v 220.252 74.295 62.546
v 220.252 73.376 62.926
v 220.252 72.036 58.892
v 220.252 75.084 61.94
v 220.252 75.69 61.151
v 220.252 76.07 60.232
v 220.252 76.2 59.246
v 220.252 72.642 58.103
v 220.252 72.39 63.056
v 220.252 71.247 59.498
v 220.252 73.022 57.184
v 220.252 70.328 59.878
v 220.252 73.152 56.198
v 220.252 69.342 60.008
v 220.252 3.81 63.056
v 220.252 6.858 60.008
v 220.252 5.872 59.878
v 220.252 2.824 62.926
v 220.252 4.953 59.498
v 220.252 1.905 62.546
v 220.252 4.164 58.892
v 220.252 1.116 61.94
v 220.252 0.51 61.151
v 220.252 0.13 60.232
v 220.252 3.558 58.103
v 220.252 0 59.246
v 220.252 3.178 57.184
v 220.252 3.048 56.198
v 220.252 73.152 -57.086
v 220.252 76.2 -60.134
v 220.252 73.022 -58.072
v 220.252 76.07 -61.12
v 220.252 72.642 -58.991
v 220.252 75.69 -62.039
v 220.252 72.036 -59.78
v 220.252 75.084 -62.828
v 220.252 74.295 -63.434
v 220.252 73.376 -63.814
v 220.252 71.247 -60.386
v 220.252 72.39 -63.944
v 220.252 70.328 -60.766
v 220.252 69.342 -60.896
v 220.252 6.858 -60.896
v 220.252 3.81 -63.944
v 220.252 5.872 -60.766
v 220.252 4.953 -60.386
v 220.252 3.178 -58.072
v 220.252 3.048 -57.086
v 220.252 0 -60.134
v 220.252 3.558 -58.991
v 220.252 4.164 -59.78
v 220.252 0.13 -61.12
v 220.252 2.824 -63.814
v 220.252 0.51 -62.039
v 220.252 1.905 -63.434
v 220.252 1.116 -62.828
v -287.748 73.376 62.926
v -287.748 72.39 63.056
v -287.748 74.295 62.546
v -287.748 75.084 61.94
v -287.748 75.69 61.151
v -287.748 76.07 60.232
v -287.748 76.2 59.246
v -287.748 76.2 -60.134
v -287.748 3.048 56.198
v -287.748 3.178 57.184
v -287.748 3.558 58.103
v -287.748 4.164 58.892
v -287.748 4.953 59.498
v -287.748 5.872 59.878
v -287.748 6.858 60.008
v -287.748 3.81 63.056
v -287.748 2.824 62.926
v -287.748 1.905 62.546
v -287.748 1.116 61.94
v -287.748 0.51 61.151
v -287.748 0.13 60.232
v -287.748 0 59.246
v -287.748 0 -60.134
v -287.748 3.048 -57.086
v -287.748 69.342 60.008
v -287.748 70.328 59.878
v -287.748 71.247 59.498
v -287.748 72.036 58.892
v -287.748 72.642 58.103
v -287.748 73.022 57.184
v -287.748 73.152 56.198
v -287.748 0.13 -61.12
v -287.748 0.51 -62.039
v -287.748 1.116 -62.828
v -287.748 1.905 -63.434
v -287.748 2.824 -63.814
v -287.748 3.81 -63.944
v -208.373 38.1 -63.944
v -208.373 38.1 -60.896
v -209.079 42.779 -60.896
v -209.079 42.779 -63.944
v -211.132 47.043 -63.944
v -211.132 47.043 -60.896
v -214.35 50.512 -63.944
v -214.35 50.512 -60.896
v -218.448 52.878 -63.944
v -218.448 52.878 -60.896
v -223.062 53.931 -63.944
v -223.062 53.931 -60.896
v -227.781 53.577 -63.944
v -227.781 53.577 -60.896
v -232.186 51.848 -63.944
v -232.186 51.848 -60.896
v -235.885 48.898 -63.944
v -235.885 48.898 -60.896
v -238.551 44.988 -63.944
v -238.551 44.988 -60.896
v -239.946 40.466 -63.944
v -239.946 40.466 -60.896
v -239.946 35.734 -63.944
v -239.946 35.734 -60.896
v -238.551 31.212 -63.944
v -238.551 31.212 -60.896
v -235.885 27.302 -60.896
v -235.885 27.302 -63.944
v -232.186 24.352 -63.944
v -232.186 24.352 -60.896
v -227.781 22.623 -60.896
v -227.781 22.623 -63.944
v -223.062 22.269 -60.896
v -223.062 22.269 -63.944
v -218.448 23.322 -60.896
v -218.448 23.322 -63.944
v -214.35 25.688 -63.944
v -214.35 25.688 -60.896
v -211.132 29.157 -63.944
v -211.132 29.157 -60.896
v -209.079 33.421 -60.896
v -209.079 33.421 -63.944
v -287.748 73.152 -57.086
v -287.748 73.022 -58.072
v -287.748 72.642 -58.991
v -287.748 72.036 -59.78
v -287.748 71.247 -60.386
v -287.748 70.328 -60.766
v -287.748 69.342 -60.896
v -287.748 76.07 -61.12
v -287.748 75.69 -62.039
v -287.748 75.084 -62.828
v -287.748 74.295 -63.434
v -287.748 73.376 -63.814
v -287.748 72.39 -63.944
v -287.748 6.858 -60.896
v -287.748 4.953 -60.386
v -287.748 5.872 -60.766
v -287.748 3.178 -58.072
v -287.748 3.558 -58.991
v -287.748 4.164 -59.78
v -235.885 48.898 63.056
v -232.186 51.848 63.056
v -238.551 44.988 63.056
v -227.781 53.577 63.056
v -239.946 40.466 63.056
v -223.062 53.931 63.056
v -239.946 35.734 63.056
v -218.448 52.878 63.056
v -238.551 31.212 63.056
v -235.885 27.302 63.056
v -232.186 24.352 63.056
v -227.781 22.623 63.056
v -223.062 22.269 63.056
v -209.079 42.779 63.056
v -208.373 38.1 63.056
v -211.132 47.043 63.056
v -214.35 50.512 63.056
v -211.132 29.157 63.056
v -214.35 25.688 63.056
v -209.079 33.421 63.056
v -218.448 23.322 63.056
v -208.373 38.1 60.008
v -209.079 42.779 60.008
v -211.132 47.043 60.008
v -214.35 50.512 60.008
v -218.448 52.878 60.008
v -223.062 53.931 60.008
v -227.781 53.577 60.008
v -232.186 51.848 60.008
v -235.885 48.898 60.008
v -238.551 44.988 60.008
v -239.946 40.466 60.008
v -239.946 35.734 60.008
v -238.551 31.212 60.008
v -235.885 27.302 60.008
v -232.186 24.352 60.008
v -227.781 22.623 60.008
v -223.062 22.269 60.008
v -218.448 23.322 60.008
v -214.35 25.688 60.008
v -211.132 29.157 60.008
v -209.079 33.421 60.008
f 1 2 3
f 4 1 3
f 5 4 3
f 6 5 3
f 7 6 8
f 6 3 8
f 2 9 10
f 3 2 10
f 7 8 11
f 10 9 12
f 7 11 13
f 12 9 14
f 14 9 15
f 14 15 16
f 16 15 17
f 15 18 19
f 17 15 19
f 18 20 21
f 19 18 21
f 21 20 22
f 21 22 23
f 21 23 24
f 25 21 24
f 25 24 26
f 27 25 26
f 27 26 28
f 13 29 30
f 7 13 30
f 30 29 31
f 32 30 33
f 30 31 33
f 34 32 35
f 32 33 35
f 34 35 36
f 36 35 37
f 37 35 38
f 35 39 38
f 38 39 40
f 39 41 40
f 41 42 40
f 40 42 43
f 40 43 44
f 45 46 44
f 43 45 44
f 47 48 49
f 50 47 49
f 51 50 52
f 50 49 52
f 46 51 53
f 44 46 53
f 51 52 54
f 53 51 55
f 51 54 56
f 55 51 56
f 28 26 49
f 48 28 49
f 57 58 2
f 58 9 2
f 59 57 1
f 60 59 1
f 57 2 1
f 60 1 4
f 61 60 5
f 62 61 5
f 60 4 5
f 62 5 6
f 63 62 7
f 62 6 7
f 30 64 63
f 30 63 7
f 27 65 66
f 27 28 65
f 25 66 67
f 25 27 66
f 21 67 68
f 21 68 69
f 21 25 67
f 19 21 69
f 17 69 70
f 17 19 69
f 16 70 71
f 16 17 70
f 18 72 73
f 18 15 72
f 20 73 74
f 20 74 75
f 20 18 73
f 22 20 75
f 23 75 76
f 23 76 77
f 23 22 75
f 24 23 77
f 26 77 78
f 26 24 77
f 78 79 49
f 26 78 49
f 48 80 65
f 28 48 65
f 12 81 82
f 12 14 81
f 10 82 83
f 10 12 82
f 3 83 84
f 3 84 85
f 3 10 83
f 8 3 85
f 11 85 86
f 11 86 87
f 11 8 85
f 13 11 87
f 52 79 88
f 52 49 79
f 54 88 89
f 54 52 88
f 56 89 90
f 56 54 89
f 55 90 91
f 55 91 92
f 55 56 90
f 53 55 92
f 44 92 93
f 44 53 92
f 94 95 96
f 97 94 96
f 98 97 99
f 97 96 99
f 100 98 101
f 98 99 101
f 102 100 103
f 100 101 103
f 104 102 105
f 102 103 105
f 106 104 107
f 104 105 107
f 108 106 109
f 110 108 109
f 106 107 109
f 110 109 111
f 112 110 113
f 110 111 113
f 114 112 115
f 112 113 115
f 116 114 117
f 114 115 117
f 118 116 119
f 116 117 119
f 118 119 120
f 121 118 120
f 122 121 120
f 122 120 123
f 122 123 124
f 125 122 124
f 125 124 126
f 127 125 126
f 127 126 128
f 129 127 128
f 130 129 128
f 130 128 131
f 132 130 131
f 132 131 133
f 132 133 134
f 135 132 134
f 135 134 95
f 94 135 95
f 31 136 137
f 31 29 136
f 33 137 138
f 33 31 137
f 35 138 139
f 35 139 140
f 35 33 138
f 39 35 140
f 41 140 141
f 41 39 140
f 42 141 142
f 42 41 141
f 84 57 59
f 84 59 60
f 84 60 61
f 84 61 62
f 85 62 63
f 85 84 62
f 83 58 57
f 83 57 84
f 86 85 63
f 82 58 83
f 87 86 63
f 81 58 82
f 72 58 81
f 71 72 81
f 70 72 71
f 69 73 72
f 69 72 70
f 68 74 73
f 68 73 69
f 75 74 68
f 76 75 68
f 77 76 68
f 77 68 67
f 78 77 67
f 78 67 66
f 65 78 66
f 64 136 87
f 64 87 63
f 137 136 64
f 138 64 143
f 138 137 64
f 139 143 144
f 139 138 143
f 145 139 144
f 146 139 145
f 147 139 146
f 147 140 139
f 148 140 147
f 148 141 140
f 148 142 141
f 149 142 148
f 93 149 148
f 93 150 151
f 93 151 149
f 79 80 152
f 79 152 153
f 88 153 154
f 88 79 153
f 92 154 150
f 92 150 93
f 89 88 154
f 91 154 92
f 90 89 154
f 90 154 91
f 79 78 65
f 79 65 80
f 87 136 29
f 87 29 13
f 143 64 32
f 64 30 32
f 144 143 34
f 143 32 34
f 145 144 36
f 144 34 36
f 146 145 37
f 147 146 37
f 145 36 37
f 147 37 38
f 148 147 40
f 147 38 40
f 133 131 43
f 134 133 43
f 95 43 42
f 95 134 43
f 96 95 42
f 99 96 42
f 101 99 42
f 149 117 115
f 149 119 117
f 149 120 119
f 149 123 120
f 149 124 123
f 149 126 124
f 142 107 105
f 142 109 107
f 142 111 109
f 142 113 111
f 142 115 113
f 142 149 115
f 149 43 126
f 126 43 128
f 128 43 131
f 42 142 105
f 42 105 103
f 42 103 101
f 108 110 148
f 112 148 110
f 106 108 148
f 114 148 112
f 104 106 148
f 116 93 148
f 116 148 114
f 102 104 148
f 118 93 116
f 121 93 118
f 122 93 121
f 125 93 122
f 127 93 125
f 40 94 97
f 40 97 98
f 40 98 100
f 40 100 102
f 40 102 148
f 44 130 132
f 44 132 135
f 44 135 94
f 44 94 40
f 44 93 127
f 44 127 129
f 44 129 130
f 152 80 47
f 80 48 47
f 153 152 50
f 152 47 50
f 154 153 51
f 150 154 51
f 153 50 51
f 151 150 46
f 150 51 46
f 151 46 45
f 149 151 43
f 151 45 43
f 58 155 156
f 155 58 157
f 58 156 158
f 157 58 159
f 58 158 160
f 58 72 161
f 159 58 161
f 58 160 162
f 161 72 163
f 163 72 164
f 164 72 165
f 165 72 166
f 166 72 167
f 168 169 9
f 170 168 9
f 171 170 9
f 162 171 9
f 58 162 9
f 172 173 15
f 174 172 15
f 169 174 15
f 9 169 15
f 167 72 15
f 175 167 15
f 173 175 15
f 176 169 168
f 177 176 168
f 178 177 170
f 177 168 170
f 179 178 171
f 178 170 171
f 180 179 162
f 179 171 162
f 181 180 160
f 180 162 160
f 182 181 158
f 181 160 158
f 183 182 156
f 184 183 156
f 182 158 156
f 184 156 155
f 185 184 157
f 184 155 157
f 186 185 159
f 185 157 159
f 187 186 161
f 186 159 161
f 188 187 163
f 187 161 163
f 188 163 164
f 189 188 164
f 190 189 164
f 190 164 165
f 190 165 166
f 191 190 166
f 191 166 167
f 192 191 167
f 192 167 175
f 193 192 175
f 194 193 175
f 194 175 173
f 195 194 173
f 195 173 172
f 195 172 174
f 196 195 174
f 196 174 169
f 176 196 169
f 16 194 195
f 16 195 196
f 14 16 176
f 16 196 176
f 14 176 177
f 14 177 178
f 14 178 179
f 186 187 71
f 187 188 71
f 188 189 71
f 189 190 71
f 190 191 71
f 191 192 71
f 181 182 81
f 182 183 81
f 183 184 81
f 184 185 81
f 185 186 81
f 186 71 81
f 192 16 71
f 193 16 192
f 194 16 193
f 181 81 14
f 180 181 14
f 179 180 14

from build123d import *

# Parameters (mm, degrees)
SKETCH1_W           = 508
SKETCH1_H           = 127
BOSS_EXTRUDE1_DEPTH = 76.2
SKETCH5_W           = 120.904
SKETCH5_H           = 70.104
CUT_EXTRUDE1_DEPTH  = 509
FILLET1_R           = 3.81
SKETCH9_R           = 15.875
CUT_EXTRUDE5_DEPTH  = 128


with BuildPart() as part:
    # Sketch1 → Boss-Extrude1 (new body)
    with BuildSketch(Plane(origin=(0, 0, 0), x_dir=(1, 0, 0), z_dir=(0, 1, 0))):
        with Locations((-33.748251748, 0.444055944)):
            Rectangle(SKETCH1_W, SKETCH1_H)
    extrude(amount=BOSS_EXTRUDE1_DEPTH)

    # Sketch5 → Cut-Extrude1 (cut, through all)
    with BuildSketch(Plane.ZY.offset(287.748251748)):
        with Locations((-0.444055944, 38.1)):
            Rectangle(SKETCH5_W, SKETCH5_H)
    extrude(amount=-CUT_EXTRUDE1_DEPTH, mode=Mode.SUBTRACT)

    # Fillet1
    fillet1_edges = [part.edges().sort_by_distance(p)[0] for p in [
        (-33.748251748, 76.2, -63.944055944),
        (-33.748251748, 3.048, -60.896055944),
        (-33.748251748, 73.152, -60.896055944),
        (-33.748251748, 73.152, 60.007944056),
        (-33.748251748, 3.048, 60.007944056),
        (-33.748251748, 0, -63.944055944),
        (-33.748251748, 0, 63.055944056),
        (-33.748251748, 76.2, 63.055944056),
    ]]
    fillet(fillet1_edges, radius=FILLET1_R)

    # Sketch9 → Cut-Extrude5 (cut, through all)
    with BuildSketch(Plane.XY.offset(63.055944056)):
        with Locations((-224.248251748, 38.1)):
            Circle(SKETCH9_R)
    extrude(amount=-CUT_EXTRUDE5_DEPTH, mode=Mode.SUBTRACT)


solid = part.part
